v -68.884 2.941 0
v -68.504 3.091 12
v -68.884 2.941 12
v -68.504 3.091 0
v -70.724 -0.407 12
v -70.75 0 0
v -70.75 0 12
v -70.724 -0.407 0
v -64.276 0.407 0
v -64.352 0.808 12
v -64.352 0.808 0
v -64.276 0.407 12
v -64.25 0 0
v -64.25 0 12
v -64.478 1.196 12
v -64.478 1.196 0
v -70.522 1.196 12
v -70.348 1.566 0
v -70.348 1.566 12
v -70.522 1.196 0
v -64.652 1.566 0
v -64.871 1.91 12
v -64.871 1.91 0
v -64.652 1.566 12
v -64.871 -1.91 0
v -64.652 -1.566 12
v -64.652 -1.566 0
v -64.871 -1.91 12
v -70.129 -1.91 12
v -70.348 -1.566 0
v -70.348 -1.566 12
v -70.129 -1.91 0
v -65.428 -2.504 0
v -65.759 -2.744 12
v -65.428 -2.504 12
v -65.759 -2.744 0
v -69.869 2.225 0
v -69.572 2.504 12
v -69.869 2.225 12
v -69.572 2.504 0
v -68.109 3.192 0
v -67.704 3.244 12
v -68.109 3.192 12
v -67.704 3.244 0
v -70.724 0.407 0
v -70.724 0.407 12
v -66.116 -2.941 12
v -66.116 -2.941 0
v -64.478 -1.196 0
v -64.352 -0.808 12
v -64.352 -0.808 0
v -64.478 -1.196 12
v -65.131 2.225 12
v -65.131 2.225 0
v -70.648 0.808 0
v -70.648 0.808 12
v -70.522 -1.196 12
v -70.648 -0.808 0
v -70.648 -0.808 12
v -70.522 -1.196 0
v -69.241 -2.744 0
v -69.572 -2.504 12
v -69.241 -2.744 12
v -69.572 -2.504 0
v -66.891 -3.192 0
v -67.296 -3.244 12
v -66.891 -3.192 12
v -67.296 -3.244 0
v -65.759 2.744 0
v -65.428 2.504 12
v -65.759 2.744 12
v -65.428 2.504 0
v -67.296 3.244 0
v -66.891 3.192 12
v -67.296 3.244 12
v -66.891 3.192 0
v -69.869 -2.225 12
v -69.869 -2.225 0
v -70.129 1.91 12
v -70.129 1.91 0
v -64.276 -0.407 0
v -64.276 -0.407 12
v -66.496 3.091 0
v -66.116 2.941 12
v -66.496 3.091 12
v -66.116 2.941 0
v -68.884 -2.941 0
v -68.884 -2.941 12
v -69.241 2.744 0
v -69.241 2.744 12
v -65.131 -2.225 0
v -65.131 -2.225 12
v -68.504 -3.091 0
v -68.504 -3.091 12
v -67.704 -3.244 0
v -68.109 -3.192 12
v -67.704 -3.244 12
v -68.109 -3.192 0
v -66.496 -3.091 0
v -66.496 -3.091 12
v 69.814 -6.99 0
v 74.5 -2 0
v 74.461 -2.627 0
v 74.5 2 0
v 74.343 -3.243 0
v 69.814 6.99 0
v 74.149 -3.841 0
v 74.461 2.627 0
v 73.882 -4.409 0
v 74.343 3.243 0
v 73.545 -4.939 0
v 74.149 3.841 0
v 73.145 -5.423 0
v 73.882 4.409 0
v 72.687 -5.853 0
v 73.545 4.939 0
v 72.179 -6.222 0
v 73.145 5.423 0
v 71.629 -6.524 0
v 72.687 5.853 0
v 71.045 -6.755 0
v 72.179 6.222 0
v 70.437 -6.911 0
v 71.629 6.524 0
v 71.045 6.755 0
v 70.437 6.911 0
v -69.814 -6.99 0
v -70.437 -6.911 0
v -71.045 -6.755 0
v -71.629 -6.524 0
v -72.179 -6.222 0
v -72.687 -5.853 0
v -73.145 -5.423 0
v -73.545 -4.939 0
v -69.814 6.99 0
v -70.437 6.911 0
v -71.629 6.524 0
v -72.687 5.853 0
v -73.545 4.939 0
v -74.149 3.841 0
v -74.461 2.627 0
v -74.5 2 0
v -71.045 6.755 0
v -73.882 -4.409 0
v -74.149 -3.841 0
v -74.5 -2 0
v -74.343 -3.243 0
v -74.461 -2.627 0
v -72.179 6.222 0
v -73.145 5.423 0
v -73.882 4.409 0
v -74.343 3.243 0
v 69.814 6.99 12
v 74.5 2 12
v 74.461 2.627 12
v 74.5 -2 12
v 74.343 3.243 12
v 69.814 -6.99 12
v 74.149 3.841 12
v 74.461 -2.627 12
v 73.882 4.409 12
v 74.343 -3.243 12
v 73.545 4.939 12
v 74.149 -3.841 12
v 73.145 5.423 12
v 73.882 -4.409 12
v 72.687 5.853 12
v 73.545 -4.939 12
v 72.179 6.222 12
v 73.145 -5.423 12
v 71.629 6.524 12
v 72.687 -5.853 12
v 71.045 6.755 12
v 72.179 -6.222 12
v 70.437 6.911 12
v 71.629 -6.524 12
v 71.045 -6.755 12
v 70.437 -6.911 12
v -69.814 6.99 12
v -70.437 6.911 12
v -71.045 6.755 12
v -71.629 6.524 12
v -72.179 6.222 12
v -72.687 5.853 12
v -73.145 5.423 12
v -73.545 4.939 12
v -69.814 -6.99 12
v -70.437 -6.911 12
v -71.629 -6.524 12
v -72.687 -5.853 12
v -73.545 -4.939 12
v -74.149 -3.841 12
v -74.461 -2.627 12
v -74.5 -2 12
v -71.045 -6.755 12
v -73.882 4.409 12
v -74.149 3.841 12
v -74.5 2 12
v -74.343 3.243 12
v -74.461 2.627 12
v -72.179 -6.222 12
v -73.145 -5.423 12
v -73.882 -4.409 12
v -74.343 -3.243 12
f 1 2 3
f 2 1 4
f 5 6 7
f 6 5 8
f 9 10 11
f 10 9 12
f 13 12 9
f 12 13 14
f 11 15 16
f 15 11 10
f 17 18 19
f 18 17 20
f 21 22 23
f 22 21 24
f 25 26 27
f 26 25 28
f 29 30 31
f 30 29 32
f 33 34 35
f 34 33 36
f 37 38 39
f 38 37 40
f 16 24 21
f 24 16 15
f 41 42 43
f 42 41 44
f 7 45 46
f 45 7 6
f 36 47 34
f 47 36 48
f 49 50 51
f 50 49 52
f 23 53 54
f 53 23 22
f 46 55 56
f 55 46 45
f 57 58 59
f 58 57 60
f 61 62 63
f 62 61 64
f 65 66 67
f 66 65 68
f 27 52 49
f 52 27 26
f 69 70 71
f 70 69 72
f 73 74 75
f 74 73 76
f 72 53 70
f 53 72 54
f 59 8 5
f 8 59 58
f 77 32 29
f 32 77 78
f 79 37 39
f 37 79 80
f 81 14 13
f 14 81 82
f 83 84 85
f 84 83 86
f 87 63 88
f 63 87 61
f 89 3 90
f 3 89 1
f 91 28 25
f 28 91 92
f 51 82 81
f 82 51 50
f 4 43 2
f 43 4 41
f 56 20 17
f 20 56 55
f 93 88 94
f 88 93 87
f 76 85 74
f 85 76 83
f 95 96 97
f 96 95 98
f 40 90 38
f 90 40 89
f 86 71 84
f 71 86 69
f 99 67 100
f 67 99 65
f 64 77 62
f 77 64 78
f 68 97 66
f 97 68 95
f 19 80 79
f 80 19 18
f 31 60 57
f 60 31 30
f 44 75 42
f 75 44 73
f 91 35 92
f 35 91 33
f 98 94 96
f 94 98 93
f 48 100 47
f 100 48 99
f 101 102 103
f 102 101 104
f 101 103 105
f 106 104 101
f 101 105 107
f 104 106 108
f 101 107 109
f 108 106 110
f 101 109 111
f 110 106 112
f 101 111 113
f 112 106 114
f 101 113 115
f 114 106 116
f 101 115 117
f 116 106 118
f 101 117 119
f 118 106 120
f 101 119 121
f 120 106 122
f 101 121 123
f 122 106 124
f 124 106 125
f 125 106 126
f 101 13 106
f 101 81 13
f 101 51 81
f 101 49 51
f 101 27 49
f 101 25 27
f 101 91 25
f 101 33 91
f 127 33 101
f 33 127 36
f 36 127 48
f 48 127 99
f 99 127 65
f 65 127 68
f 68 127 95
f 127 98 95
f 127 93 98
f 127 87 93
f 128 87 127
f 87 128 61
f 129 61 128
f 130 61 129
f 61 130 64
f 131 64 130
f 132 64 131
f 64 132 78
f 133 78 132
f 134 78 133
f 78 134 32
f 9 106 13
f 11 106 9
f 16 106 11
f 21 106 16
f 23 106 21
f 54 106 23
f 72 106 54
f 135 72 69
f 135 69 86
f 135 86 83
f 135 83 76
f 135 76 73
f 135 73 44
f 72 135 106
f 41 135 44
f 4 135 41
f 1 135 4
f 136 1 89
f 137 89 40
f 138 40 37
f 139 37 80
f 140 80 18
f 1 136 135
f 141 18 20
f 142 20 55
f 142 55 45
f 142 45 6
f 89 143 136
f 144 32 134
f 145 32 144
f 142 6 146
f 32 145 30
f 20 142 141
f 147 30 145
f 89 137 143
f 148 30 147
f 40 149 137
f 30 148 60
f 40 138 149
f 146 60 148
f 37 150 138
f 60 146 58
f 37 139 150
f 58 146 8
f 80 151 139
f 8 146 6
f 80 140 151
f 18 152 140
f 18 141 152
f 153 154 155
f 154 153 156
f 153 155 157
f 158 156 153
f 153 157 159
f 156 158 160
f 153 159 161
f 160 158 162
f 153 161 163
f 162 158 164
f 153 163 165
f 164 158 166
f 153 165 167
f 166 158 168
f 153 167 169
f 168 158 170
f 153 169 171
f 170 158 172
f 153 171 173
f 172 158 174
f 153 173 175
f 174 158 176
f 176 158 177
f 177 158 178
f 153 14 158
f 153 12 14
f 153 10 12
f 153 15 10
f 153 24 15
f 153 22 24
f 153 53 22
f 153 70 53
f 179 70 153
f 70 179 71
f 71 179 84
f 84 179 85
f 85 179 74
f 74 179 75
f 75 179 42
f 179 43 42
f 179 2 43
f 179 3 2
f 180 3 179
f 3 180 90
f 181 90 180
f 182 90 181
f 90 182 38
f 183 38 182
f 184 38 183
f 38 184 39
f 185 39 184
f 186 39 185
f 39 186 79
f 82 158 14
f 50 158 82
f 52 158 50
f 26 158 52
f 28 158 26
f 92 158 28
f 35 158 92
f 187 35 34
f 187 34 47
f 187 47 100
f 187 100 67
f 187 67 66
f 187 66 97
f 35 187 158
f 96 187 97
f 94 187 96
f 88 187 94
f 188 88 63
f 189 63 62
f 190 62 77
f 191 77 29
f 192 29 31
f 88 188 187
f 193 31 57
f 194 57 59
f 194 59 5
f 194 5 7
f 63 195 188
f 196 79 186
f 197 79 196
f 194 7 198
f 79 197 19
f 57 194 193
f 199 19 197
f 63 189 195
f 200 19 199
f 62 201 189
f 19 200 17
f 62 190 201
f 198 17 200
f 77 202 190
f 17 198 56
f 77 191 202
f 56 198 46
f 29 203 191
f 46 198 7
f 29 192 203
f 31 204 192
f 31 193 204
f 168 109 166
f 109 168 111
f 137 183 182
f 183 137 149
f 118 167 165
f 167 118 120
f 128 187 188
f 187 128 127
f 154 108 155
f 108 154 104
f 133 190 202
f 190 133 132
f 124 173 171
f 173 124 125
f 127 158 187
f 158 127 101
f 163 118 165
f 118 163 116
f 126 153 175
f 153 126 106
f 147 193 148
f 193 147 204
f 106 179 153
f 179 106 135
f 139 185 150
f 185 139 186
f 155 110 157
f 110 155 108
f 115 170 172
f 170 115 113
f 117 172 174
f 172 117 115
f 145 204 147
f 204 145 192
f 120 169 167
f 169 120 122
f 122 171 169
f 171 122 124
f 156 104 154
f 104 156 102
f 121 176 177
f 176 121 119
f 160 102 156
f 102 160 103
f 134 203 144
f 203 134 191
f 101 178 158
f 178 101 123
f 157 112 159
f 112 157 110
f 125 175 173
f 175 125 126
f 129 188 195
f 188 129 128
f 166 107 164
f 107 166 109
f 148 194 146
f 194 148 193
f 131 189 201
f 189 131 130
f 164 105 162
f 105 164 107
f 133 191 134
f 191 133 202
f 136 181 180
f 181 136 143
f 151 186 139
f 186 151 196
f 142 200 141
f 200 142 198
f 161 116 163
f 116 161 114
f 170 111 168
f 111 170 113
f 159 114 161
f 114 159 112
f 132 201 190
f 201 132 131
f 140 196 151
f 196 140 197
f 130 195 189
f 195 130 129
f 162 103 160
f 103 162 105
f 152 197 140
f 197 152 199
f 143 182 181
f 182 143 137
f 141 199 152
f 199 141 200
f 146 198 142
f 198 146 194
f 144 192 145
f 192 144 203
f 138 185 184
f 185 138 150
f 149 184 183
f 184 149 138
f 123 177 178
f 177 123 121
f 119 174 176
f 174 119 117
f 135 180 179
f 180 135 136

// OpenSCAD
$fn = 50;


difference() {
	union() {
		hull() {
			translate(v = [-69.5000000000, 2.0000000000, 0]) {
				cylinder(h = 12, r = 5);
			}
			translate(v = [69.5000000000, 2.0000000000, 0]) {
				cylinder(h = 12, r = 5);
			}
			translate(v = [-69.5000000000, -2.0000000000, 0]) {
				cylinder(h = 12, r = 5);
			}
			translate(v = [69.5000000000, -2.0000000000, 0]) {
				cylinder(h = 12, r = 5);
			}
		}
	}
	union() {
		translate(v = [-67.5000000000, 0.0000000000, 0]) {
			cylinder(h = 12, r = 3.2500000000);
		}
		translate(v = [-67.5000000000, 0.0000000000, 0]) {
			cylinder(h = 12, r = 1.8000000000);
		}
		translate(v = [-67.5000000000, 0.0000000000, 0]) {
			cylinder(h = 12, r = 1.8000000000);
		}
		translate(v = [-67.5000000000, 0.0000000000, 0]) {
			cylinder(h = 12, r = 1.8000000000);
		}
	}
}
